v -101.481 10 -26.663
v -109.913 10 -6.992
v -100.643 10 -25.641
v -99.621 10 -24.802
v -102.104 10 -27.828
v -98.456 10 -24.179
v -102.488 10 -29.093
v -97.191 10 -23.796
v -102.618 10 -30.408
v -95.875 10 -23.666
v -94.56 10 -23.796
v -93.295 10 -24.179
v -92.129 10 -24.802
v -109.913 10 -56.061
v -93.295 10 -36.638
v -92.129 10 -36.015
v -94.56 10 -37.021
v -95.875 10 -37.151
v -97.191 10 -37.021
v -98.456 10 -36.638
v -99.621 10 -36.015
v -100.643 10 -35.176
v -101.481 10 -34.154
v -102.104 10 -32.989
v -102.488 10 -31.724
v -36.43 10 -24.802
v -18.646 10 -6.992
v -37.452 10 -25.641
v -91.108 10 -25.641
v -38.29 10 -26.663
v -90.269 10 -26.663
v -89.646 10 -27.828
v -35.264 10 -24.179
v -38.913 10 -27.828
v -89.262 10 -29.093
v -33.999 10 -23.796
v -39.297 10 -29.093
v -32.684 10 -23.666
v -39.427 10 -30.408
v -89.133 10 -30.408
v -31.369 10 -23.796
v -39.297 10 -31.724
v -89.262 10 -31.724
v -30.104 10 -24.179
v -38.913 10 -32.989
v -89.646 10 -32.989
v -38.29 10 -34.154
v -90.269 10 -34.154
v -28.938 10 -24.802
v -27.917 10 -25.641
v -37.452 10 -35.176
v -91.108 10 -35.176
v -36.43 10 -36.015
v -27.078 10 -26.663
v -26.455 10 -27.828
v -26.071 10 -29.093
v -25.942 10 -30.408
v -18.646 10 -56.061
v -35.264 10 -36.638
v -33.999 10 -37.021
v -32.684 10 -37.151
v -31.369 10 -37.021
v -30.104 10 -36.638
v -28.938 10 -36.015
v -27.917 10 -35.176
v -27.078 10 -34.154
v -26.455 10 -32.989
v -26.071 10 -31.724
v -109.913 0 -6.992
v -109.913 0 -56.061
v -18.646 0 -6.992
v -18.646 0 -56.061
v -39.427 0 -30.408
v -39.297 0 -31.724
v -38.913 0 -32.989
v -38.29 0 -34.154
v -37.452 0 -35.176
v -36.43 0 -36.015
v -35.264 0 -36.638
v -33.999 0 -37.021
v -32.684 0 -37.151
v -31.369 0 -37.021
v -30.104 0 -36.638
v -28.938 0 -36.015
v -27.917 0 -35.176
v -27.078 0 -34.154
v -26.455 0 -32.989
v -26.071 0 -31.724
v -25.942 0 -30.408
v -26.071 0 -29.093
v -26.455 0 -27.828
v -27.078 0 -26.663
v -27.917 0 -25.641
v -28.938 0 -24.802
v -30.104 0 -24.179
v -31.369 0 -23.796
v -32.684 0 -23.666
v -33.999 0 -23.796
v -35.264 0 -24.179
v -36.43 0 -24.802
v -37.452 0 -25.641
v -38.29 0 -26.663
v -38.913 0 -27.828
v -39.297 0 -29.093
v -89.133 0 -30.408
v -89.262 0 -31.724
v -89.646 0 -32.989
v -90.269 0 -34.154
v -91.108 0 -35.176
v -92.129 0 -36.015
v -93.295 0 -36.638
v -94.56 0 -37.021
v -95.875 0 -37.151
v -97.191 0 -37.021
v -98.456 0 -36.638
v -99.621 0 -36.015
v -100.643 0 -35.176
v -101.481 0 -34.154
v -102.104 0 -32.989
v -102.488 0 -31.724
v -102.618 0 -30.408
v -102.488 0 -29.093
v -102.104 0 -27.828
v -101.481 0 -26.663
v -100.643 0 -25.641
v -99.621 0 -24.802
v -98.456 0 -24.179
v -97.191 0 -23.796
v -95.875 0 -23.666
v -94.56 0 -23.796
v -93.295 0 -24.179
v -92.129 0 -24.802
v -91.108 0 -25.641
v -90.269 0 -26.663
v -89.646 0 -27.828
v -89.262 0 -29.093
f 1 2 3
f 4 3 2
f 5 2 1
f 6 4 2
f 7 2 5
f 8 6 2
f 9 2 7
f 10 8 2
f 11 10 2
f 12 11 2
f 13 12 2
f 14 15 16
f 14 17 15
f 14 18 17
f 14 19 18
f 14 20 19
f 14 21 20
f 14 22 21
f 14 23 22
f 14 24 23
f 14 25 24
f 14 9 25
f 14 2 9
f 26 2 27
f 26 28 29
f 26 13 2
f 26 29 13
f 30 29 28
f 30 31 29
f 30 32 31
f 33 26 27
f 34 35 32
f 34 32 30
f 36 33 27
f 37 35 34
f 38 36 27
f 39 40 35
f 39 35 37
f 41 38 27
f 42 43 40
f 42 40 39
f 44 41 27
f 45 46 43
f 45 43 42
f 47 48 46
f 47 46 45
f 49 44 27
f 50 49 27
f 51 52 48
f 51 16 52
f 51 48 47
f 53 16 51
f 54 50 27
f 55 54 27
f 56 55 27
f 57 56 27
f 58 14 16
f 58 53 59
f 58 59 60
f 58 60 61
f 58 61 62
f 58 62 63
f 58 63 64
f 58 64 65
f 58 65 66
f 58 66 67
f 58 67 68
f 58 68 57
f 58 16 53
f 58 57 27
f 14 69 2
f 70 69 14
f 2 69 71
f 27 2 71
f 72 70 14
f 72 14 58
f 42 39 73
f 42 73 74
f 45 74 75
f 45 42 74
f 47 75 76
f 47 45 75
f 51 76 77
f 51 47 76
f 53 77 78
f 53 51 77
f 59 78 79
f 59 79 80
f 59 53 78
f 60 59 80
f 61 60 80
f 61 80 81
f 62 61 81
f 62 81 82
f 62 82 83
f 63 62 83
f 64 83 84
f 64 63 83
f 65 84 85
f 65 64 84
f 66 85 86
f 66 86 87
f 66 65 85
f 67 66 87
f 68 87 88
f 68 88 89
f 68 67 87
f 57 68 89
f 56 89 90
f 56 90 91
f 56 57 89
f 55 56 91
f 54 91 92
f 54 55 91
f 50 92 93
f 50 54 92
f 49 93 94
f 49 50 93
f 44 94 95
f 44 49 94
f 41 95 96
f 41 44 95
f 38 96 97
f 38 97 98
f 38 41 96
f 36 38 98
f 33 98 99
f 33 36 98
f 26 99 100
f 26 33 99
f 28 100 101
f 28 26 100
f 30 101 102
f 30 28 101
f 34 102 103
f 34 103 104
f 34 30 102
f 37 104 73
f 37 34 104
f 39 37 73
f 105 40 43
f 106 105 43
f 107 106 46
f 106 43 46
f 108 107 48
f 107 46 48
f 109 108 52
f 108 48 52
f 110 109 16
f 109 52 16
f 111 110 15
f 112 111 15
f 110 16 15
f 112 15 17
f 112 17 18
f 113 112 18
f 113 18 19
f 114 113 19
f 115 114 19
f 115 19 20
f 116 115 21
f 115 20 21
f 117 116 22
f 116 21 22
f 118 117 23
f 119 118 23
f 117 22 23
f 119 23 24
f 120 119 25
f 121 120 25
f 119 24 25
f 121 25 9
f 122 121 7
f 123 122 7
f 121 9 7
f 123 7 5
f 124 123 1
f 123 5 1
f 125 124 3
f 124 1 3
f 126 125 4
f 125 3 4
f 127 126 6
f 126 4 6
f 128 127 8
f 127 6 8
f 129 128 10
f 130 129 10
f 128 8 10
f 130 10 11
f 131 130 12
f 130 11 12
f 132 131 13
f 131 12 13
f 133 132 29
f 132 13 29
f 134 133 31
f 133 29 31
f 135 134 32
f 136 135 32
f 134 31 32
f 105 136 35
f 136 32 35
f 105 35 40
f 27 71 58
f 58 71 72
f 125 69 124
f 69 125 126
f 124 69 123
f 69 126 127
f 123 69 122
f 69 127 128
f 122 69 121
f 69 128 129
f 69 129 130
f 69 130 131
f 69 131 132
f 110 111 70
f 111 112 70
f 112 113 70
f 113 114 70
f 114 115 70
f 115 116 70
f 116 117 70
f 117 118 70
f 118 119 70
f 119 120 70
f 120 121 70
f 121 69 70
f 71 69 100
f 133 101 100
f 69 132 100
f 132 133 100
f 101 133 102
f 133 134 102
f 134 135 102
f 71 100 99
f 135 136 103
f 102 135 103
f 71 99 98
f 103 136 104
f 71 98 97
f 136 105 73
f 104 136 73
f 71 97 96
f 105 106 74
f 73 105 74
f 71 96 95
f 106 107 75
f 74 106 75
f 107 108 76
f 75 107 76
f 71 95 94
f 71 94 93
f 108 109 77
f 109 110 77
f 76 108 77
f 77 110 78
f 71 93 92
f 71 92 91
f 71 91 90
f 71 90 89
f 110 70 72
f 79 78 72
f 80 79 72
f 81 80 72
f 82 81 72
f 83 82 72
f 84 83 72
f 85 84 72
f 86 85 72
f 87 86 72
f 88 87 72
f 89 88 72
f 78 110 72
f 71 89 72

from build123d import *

# Parameters (mm, degrees)
SKETCH1_W           = 91.267371632
SKETCH1_H           = 49.068479372
BOSS_EXTRUDE1_DEPTH = 10
SKETCH2_R           = 6.742418782
CUT_EXTRUDE2_DEPTH  = 10


with BuildPart() as part:
    # Sketch1 → Boss-Extrude1 (new body)
    with BuildSketch(Plane(origin=(0, 0, 0), x_dir=(1, 0, 0), z_dir=(0, 1, 0))):
        with Locations((-64.279707977, 31.526497996)):
            Rectangle(SKETCH1_W, SKETCH1_H)
    extrude(amount=BOSS_EXTRUDE1_DEPTH)

    # Sketch2 → Cut-Extrude2 (cut)
    with BuildSketch(Plane(origin=(0, 10, 0), x_dir=(1, 0, 0), z_dir=(0, 1, 0))):
        with Locations((-95.875303576, 30.408499998)):
            Circle(SKETCH2_R)
    cut_extrude2 = extrude(amount=-CUT_EXTRUDE2_DEPTH, mode=Mode.SUBTRACT)

    # Mirror1: Cut-Extrude2 across plane
    add(cut_extrude2.mirror(Plane.ZY.offset(64.279707977)), mode=Mode.SUBTRACT)


solid = part.part
